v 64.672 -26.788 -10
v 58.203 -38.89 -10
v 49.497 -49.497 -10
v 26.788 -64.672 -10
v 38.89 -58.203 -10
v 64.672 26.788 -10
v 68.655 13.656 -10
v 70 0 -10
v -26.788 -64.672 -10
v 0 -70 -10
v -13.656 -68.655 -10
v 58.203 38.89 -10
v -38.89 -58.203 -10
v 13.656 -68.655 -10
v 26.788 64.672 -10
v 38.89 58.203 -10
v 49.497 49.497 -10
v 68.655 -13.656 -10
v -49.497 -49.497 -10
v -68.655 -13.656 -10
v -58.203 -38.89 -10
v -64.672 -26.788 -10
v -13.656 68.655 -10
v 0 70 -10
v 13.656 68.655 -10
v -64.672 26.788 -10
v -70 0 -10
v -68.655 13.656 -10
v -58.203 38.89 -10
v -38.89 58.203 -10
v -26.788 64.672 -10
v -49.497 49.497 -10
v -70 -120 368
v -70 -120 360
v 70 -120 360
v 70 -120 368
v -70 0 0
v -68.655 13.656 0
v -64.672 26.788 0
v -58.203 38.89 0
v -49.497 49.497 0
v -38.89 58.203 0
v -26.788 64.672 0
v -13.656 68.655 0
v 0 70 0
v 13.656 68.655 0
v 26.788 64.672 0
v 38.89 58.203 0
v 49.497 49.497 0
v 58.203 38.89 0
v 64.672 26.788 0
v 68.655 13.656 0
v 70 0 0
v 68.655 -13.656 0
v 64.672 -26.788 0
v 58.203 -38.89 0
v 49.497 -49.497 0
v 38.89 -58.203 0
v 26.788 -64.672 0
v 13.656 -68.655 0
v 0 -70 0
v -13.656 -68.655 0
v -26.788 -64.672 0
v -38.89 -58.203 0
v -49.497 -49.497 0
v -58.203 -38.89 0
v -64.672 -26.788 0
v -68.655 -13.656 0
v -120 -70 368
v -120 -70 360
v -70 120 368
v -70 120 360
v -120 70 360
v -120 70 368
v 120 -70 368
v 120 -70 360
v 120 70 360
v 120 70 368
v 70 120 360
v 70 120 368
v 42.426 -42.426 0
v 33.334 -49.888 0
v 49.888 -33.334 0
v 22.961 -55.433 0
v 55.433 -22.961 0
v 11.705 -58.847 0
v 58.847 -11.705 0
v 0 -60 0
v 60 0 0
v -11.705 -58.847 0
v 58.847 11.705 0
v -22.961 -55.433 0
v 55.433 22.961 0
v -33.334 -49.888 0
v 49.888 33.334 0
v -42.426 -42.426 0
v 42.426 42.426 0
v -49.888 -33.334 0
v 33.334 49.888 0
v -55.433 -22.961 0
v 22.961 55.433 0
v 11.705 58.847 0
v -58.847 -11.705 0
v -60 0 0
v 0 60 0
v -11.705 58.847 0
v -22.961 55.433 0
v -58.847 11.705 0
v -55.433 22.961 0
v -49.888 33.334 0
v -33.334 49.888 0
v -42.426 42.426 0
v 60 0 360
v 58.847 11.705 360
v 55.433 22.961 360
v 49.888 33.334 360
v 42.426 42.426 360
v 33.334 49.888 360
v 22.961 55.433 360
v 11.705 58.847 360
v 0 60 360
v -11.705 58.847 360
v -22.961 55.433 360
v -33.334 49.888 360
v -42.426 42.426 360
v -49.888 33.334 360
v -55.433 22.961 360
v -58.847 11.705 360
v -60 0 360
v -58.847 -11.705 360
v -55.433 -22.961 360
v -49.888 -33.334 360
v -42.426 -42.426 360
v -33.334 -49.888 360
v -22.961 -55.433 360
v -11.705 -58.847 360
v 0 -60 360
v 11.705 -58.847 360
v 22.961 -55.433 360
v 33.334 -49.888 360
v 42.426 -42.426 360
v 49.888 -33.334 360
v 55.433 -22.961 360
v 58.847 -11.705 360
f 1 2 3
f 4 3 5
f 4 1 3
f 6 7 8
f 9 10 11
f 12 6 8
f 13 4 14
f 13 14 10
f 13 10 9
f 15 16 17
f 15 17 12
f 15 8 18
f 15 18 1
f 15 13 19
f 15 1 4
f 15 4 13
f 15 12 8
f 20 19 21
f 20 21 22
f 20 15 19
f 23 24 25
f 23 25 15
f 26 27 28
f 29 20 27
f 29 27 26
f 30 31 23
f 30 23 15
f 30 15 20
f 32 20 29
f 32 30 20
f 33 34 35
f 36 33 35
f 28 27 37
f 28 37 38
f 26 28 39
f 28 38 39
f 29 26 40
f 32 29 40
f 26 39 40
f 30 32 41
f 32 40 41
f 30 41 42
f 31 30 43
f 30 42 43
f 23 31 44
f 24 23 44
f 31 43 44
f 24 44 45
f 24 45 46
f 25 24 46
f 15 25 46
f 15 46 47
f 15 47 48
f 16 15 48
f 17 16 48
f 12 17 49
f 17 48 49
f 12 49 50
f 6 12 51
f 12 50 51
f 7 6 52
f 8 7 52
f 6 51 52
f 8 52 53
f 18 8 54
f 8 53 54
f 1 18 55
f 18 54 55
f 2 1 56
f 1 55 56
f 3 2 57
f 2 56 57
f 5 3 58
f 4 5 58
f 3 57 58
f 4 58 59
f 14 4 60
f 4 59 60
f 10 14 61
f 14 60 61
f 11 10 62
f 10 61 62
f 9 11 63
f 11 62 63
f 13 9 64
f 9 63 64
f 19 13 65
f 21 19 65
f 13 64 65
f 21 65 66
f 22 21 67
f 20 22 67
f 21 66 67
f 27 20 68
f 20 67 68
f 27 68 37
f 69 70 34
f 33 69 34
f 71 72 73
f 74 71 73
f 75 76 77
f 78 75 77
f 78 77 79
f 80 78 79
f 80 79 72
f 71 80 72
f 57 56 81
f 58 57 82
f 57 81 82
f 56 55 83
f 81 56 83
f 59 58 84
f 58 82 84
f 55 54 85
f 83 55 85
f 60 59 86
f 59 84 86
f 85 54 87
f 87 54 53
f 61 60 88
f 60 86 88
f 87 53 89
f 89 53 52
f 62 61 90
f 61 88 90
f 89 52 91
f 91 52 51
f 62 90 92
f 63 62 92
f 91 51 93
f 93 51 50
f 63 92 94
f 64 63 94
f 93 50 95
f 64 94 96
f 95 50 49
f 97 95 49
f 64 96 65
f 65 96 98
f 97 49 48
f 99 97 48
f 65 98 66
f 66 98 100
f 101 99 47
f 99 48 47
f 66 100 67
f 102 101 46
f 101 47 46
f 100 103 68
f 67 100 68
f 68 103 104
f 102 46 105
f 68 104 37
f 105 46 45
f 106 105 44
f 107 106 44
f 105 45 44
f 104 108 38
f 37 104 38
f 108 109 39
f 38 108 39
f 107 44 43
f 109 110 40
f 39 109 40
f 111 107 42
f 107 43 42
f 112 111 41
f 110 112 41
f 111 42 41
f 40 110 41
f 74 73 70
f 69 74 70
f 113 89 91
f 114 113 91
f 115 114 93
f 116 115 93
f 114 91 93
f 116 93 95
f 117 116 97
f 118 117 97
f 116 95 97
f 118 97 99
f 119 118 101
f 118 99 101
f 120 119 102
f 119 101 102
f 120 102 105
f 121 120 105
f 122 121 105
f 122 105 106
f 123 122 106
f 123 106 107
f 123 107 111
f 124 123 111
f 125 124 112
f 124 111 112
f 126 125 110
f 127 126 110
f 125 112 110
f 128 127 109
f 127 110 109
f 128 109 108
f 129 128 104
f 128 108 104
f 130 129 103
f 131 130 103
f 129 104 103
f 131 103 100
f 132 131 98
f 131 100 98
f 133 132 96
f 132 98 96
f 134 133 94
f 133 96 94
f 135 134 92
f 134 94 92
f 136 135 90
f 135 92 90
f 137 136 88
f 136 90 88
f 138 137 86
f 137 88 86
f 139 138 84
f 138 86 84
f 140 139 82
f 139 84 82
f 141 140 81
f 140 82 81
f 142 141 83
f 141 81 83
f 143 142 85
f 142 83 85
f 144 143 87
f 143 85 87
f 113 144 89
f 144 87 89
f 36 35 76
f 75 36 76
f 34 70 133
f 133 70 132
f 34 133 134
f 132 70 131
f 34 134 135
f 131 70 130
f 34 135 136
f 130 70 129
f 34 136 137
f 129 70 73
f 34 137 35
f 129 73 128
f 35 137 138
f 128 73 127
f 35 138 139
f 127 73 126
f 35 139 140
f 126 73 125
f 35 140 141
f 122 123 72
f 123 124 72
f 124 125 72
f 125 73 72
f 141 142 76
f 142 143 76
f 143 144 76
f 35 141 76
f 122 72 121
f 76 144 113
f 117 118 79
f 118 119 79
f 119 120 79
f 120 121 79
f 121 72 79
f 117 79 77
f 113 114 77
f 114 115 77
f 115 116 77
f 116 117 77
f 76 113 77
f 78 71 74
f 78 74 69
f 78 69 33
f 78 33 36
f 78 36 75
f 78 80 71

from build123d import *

# Parameters (mm, degrees)
SKETCH2_R           = 60
BOSS_EXTRUDE1_DEPTH = 360
SKETCH3_R           = 70
BOSS_EXTRUDE2_DEPTH = 10
BOSS_EXTRUDE4_DEPTH = 8


with BuildPart() as part:
    # Sketch2 → Boss-Extrude1 (new body)
    with BuildSketch(Plane.XY):
        Circle(SKETCH2_R)
    extrude(amount=BOSS_EXTRUDE1_DEPTH)

    # Sketch3 → Boss-Extrude2 (add)
    with BuildSketch(Plane(origin=(0, 0, 0), x_dir=(-1, 0, 0), z_dir=(0, 0, -1))):
        Circle(SKETCH3_R)
    extrude(amount=BOSS_EXTRUDE2_DEPTH)

    # Sketch4 → Boss-Extrude4 (add)
    with BuildSketch(Plane.XY.offset(360)):
        Polygon((-70, 120), (-120, 70), (-120, -70), (-70, -120), (70, -120), (120, -70), (120, 70), (70, 120), align=None)
    extrude(amount=BOSS_EXTRUDE4_DEPTH)


solid = part.part
